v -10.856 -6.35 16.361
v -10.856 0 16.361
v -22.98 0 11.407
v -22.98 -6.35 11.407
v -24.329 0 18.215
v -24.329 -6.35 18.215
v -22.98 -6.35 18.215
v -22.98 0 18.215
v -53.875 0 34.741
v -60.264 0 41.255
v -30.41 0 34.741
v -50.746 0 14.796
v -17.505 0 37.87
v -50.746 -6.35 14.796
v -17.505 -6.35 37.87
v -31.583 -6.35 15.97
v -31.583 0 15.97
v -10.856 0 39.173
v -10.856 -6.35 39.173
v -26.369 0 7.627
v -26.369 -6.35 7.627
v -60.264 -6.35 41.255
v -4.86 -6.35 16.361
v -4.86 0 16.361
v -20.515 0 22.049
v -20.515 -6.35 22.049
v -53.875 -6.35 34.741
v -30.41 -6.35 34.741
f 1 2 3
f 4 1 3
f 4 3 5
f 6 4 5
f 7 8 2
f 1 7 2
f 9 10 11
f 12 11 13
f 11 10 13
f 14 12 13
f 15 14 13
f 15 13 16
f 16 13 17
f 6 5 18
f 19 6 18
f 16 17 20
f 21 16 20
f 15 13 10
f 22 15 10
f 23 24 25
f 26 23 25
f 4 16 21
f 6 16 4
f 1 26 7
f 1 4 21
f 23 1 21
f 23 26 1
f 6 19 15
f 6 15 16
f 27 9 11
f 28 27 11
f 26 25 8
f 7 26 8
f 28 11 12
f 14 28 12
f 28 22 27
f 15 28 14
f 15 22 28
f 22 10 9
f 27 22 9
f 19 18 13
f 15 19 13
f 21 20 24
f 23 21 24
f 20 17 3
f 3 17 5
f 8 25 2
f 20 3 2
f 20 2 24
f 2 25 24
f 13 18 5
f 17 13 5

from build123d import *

# Parameters (mm, degrees)
F1_DEPTH = 6.35


with BuildPart() as f1:
    # F0 (on Front) → F1 (new body)
    with BuildSketch(Plane.XZ):
        Polygon((-10.856368, 39.173357), (-17.504653, 37.86977), (-31.583376, 15.969533), (-26.369035, 7.626586), (-4.859874, 16.360609), (-20.515446, 22.048584), (-22.979714, 18.215278), (-10.856368, 16.360609), (-22.979714, 11.406984), (-24.329418, 18.215278), align=None)
        Polygon((-30.41015, 34.741167), (-50.746087, 14.796306), (-17.504653, 37.86977), (-60.263562, 41.255311), (-53.87469, 34.741167), align=None)
    extrude(amount=F1_DEPTH)


solid = f1.part
